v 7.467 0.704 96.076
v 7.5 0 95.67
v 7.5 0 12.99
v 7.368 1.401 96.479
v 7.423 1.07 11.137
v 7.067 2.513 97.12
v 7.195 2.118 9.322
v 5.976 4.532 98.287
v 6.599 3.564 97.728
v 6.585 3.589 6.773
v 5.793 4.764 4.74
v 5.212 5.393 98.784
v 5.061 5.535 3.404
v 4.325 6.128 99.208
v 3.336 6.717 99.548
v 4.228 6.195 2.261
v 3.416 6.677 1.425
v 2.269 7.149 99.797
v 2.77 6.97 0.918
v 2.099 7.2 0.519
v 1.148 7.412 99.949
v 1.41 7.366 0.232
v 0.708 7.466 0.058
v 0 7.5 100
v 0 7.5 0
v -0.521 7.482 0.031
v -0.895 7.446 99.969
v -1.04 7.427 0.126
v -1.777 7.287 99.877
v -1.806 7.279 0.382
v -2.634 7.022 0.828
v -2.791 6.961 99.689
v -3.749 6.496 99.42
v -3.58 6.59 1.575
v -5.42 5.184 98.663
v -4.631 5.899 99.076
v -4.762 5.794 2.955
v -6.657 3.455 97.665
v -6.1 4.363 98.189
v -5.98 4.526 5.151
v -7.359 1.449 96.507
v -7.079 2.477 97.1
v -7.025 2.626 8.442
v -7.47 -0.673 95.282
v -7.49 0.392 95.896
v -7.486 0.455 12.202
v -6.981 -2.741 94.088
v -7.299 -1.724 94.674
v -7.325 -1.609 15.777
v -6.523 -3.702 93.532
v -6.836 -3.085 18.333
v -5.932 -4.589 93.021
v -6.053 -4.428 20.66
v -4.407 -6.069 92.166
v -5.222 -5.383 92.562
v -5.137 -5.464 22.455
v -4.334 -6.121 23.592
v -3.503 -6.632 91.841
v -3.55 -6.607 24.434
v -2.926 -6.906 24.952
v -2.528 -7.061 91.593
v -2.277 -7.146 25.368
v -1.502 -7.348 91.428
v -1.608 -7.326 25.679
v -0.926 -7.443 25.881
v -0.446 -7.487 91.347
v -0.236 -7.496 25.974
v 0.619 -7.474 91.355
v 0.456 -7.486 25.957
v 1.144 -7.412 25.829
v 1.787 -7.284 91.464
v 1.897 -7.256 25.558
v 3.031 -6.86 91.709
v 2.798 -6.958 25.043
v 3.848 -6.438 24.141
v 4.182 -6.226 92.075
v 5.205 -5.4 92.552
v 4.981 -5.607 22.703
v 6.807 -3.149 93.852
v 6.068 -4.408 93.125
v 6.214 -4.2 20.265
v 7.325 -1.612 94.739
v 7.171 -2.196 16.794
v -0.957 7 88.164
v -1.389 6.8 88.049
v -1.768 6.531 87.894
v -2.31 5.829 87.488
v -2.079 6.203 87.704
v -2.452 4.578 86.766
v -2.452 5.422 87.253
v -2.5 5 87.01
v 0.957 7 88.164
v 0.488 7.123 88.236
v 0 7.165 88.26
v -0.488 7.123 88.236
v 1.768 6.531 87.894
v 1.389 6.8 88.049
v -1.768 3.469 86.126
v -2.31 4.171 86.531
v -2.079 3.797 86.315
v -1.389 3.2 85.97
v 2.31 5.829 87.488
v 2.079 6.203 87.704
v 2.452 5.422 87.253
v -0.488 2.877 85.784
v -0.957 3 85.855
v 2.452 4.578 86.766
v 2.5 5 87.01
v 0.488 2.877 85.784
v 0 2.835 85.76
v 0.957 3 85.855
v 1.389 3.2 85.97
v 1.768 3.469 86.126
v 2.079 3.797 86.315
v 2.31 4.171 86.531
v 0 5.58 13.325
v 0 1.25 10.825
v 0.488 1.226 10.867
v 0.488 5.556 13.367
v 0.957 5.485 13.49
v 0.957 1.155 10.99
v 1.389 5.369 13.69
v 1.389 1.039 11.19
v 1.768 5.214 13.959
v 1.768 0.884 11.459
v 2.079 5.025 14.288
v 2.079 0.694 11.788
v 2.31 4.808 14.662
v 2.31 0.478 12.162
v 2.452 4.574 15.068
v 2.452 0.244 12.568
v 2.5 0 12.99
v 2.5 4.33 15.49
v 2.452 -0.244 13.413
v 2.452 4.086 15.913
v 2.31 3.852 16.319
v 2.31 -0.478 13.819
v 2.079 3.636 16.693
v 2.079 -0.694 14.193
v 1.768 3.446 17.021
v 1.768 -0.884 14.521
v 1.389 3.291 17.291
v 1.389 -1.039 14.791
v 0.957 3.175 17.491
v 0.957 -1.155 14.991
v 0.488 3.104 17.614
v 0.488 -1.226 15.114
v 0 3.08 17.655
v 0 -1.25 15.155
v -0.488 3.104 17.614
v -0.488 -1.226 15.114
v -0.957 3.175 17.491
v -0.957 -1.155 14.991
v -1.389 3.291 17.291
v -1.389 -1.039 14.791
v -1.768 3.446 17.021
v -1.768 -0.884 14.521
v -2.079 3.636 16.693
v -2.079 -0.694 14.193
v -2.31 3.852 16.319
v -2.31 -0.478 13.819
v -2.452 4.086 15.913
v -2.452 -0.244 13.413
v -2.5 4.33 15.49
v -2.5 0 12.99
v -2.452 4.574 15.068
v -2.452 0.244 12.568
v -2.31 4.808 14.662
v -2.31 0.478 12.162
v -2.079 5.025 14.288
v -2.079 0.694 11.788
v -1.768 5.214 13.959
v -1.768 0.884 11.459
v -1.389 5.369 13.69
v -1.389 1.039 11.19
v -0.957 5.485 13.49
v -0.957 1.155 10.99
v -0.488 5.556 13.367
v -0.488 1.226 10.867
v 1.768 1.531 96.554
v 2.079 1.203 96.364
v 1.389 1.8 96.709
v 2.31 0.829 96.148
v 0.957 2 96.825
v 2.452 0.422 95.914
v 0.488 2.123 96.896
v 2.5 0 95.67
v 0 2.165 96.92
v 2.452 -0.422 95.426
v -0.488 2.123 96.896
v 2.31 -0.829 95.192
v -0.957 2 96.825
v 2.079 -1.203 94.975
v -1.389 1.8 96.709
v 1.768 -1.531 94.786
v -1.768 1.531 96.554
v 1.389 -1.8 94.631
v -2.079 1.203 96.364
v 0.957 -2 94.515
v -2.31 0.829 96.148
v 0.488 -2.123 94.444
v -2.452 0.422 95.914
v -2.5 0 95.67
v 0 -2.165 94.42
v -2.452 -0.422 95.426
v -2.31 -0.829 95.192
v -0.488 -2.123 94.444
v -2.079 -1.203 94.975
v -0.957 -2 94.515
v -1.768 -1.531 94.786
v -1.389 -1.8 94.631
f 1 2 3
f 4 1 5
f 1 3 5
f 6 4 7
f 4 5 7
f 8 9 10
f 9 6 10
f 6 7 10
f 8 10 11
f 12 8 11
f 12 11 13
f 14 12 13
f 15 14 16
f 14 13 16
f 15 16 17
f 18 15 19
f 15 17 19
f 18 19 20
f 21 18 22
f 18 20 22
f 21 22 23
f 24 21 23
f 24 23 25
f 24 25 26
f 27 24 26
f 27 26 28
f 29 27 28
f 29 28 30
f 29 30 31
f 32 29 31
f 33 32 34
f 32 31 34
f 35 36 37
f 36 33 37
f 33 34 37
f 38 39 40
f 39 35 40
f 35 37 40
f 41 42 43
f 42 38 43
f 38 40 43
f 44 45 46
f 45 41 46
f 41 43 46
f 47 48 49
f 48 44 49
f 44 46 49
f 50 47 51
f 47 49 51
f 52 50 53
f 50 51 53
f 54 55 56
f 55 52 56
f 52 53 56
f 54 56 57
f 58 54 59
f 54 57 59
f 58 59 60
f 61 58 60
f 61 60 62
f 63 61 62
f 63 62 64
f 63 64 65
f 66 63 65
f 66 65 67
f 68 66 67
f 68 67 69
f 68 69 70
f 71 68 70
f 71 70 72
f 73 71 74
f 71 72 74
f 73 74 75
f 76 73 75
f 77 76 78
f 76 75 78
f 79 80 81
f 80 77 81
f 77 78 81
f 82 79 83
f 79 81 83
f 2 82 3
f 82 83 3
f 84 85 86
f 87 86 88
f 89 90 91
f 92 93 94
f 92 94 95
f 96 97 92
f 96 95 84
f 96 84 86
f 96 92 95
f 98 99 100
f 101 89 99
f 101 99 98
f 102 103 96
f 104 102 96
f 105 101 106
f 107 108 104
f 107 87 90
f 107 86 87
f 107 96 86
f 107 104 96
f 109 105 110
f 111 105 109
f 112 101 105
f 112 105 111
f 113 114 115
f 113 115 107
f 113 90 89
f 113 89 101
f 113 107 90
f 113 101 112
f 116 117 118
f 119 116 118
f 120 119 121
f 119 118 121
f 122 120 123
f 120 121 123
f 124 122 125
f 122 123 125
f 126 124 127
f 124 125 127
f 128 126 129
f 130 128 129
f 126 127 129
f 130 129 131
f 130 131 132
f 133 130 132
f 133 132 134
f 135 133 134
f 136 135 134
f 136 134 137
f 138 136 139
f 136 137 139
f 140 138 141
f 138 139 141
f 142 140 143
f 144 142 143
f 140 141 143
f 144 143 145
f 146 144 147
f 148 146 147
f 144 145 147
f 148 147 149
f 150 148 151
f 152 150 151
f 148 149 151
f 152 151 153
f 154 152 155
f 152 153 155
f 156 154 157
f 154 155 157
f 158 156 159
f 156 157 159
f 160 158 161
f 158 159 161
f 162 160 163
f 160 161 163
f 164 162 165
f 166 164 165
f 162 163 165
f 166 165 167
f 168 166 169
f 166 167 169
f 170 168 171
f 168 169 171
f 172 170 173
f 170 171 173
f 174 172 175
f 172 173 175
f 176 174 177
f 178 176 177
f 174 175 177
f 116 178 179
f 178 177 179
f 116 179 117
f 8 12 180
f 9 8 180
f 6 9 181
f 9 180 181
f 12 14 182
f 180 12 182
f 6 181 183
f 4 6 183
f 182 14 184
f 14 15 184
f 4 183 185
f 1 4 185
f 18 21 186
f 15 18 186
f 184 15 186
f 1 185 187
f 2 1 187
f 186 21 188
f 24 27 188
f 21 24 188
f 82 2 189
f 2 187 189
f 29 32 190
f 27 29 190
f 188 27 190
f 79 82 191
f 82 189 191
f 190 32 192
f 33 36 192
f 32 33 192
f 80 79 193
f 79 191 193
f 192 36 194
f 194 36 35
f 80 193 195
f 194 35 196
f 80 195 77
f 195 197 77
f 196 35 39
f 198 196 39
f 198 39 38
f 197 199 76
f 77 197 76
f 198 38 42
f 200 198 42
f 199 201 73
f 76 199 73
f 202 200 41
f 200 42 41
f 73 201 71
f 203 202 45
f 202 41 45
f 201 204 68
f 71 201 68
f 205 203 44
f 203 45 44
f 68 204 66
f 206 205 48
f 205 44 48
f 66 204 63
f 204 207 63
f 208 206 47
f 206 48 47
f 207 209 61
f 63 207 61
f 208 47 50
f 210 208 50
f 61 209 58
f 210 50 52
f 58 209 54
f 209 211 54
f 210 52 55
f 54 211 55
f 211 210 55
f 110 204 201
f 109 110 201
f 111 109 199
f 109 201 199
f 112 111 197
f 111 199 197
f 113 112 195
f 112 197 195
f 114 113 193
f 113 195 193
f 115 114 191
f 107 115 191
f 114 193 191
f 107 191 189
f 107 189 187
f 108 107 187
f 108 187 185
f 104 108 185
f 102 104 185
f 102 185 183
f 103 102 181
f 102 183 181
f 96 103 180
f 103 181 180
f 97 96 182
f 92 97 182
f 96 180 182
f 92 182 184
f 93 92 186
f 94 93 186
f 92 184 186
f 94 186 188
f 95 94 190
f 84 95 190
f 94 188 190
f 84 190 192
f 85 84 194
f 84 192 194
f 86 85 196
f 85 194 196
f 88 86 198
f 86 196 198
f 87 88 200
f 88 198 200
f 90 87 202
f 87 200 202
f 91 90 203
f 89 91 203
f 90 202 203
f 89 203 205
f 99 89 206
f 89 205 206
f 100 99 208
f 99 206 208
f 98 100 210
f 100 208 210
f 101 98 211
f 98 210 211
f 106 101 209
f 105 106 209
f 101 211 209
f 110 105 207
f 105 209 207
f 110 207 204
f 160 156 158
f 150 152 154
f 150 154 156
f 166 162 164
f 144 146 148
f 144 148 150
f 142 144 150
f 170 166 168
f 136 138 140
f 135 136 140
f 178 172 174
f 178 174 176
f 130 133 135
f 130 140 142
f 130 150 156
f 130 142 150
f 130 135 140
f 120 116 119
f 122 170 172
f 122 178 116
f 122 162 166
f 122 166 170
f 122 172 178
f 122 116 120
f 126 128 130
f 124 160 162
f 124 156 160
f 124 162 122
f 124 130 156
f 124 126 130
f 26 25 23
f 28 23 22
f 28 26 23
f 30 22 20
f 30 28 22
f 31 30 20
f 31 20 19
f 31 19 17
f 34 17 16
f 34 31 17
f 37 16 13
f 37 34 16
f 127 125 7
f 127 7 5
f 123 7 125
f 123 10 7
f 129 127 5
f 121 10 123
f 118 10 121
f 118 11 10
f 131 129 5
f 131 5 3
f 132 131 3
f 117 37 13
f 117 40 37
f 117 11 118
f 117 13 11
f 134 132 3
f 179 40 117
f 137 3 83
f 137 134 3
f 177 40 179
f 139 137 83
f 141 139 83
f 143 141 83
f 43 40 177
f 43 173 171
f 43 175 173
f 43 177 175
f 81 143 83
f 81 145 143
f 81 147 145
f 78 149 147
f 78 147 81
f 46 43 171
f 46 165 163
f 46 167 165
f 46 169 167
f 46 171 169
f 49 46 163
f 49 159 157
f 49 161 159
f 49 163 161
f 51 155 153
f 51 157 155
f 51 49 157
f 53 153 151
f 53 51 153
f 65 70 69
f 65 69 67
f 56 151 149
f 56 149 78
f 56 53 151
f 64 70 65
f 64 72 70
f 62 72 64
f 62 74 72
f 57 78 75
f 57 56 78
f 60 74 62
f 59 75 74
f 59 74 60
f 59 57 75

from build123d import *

# Parameters (mm, degrees)
SKETCH2_R               = 7.5
BOSS_EXTRUDE1_DEPTH     = 100
CUT_EXTRUDE1_DEPTH      = 101.560926806
CUT_EXTRUDE1_DEPTH_BACK = 101.560926806
SKETCH4_R               = 2.5
CUT_EXTRUDE2_DEPTH      = 10
SKETCH5_R               = 2.5
CUT_EXTRUDE3_DEPTH      = 5


with BuildPart() as part:
    # Sketch2 → Boss-Extrude1 (new body)
    with BuildSketch(Plane.XY):
        Circle(SKETCH2_R)
    extrude(amount=BOSS_EXTRUDE1_DEPTH)

    # Sketch3 → Cut-Extrude1 (cut, two sides: drawn at the far end of the back side and taken through both)
    with BuildSketch(Plane(origin=(0, 0, 0), x_dir=(0, 0, -1), z_dir=(1, 0, 0)).offset(-CUT_EXTRUDE1_DEPTH_BACK)):
        Polygon((-100, 7.5), (-86.572214113, -15.75760739), (-93.968196495, -20.02767981), (-105.531182824, 0), align=None)
        Polygon((0, 7.5), (-26.836822614, -7.99424676), (-23.788631199, -13.273869162), (1.512017142, -9.243577121), (5.324456029, -3.175017221), align=None)
    extrude(amount=CUT_EXTRUDE1_DEPTH + CUT_EXTRUDE1_DEPTH_BACK, mode=Mode.SUBTRACT)

    # Sketch4 → Cut-Extrude2 (cut)
    with BuildSketch(Plane(origin=(0, -41.426270189, 71.752404736), x_dir=(1, 0, 0), z_dir=(0, -0.5000000000000044, 0.866025403784436))):
        with Locations(Location((0, 47.834936491, 0), (0, 0, 270))):
            Circle(SKETCH4_R)
    extrude(amount=-CUT_EXTRUDE2_DEPTH, mode=Mode.SUBTRACT)

    # Sketch5 → Cut-Extrude3 (cut)
    with BuildSketch(Plane(origin=(0, 5.625, 3.247595264), x_dir=(1, 0, 0), z_dir=(0, -0.8660254037844386, -0.4999999999999999))):
        with Locations(Location((0, 11.25, 0), (0, 0, 270))):
            Circle(SKETCH5_R)
    extrude(amount=-CUT_EXTRUDE3_DEPTH, mode=Mode.SUBTRACT)


solid = part.part
